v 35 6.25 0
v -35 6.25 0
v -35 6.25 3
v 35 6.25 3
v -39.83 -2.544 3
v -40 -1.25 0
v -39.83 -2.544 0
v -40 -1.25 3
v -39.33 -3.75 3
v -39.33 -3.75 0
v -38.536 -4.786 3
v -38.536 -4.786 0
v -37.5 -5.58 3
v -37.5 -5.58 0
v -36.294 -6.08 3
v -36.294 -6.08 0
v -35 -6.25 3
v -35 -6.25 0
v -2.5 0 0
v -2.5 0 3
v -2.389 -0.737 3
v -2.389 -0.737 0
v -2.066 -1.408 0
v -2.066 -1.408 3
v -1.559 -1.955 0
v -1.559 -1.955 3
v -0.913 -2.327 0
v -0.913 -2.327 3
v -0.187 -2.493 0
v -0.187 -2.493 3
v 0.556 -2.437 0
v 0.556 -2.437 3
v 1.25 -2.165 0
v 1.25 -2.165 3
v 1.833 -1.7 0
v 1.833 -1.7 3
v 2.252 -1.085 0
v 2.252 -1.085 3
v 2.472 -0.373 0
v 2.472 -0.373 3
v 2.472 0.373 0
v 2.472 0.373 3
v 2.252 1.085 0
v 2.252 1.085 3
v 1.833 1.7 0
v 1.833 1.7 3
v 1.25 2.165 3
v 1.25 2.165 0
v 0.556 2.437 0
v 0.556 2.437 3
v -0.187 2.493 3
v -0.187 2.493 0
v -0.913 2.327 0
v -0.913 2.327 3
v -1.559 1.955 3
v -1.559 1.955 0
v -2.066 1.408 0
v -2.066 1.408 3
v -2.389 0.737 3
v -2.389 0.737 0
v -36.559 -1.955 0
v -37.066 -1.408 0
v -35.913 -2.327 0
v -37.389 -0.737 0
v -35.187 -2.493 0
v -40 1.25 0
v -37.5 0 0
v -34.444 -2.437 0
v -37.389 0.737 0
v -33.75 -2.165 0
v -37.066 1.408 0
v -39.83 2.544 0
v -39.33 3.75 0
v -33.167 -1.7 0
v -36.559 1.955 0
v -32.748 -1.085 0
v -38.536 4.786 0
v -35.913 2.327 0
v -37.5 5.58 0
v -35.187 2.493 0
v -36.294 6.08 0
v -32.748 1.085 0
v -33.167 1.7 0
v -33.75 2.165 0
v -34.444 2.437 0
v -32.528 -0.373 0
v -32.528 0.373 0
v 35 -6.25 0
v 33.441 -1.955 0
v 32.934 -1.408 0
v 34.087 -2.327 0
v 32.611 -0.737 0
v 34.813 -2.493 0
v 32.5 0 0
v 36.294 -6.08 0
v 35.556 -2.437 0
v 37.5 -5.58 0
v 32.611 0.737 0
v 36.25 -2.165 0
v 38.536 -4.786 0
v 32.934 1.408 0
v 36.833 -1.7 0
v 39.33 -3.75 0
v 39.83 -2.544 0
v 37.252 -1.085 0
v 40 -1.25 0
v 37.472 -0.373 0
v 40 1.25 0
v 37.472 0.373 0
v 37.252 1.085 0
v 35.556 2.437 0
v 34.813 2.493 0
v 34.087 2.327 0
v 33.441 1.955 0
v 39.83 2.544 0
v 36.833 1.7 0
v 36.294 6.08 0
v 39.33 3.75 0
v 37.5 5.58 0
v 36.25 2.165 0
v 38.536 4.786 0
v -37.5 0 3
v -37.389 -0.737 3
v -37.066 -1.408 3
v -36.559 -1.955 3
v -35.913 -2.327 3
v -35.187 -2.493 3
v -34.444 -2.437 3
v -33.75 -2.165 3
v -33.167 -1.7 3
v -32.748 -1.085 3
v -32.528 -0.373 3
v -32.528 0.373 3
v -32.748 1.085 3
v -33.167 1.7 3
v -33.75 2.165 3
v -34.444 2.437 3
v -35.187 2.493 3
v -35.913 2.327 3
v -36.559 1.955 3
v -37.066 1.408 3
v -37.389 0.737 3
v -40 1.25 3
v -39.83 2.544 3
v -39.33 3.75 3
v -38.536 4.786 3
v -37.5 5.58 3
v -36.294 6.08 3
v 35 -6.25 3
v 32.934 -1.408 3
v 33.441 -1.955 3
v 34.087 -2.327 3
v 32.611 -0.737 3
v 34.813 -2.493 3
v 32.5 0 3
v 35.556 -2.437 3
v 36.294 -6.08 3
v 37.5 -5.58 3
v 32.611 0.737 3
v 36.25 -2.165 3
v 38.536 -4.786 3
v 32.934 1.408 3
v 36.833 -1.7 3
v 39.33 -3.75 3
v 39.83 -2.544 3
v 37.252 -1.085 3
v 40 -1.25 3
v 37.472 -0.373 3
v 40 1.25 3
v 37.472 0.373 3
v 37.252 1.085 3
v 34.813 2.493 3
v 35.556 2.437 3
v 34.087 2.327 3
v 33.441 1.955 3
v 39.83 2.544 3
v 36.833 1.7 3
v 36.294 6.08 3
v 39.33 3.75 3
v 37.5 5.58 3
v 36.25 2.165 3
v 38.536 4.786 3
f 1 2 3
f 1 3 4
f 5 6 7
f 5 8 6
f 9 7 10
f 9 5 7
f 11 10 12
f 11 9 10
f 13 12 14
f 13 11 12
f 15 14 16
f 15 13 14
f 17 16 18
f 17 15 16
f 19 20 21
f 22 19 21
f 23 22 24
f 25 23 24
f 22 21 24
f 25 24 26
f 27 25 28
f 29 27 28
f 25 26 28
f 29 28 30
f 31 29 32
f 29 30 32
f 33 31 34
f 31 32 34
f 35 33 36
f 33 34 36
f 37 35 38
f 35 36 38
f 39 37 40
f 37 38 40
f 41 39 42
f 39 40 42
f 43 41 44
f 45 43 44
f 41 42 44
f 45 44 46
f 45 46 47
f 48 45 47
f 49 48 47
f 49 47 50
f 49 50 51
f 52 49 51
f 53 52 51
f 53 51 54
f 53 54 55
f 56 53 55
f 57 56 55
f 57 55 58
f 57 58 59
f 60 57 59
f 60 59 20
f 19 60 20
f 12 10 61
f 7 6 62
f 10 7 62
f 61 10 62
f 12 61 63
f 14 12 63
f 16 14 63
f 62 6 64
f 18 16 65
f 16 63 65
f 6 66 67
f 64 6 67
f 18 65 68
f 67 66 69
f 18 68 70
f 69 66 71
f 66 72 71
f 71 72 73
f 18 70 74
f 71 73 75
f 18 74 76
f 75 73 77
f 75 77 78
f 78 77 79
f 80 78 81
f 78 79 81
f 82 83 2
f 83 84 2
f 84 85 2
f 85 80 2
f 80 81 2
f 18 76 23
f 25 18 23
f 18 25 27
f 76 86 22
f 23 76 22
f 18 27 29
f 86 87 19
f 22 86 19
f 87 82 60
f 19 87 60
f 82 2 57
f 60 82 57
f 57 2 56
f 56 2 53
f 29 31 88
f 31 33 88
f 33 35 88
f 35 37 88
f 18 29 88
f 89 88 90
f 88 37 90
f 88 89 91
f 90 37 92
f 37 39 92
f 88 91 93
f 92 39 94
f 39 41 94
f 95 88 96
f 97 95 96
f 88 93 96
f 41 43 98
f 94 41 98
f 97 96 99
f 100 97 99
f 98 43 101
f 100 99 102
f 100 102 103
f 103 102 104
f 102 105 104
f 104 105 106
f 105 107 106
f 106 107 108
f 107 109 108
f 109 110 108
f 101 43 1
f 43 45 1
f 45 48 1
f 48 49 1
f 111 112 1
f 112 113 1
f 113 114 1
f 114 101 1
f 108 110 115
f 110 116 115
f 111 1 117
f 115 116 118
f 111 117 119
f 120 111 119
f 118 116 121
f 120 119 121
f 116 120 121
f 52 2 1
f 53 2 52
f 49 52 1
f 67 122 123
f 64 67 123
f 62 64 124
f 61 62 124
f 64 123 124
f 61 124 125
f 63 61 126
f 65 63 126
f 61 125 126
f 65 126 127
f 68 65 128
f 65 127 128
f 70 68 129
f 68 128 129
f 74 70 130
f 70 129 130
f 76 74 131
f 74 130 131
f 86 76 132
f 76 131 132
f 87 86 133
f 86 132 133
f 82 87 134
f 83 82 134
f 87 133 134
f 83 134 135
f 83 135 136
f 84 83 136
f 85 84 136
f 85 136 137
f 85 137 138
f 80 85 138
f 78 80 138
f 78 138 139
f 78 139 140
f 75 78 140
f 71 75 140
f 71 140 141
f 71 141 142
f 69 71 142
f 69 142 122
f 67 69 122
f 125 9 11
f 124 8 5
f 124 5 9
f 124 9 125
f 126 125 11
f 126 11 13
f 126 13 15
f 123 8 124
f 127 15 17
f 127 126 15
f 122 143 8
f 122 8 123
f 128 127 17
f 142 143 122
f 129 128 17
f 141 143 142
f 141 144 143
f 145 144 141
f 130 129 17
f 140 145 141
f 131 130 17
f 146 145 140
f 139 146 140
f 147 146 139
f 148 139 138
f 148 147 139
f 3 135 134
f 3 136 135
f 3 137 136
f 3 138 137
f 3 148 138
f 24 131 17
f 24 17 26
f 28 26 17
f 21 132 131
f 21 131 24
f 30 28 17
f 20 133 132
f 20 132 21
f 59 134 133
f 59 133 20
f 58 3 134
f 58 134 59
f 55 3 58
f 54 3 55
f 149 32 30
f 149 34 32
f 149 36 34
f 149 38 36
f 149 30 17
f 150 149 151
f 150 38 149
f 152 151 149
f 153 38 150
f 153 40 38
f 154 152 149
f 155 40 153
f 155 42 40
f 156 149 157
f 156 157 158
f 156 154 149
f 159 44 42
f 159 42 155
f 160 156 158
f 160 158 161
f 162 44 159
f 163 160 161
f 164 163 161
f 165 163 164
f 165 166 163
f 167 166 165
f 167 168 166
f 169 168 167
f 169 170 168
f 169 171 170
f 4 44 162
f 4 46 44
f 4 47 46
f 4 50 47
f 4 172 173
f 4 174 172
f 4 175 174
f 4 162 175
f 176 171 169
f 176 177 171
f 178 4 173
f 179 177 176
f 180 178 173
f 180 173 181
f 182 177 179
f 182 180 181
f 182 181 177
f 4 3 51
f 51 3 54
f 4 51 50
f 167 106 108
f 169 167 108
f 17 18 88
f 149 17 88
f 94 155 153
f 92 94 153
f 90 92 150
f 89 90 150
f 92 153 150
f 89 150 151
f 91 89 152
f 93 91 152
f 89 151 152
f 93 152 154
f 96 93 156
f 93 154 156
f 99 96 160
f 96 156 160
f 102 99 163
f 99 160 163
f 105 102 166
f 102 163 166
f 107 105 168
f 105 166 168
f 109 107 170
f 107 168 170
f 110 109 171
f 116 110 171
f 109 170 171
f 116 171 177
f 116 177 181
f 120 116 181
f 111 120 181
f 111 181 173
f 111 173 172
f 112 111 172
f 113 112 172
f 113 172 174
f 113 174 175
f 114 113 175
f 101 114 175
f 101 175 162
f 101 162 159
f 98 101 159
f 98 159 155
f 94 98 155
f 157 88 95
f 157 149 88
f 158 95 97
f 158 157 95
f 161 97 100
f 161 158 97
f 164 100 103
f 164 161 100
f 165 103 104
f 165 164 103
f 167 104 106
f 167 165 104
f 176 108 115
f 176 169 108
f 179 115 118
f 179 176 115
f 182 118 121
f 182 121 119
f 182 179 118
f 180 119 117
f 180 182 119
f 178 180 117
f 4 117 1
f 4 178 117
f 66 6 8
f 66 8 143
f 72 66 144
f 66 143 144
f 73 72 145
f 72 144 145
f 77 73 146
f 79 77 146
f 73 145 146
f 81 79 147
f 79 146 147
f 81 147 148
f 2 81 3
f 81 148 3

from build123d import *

# Parameters (mm, degrees)
F0_W     = 80
F0_H     = 12.5
F1_DEPTH = 3
F2_R     = 5
F4_D     = 5


with BuildPart() as f1:
    # F0 (on Top) → F1 (new body)
    with BuildSketch(Plane.XY):
        Rectangle(F0_W, F0_H)
    extrude(amount=F1_DEPTH)

    # F2
    f2_edges = [f1.edges().sort_by_distance(p)[0] for p in [
        (40, -6.25, 1.5),
        (40, 6.25, 1.5),
        (-40, -6.25, 1.5),
        (-40, 6.25, 1.5),
    ]]
    fillet(f2_edges, radius=F2_R)

    # F4 (through all)
    with Locations(Plane(origin=(0, 0, 0), x_dir=(1, 0, 0), z_dir=(0, 0, -1))):
        with Locations((-35, 0), (0, 0), (35, 0)):
            Hole(F4_D / 2)


solid = f1.part
